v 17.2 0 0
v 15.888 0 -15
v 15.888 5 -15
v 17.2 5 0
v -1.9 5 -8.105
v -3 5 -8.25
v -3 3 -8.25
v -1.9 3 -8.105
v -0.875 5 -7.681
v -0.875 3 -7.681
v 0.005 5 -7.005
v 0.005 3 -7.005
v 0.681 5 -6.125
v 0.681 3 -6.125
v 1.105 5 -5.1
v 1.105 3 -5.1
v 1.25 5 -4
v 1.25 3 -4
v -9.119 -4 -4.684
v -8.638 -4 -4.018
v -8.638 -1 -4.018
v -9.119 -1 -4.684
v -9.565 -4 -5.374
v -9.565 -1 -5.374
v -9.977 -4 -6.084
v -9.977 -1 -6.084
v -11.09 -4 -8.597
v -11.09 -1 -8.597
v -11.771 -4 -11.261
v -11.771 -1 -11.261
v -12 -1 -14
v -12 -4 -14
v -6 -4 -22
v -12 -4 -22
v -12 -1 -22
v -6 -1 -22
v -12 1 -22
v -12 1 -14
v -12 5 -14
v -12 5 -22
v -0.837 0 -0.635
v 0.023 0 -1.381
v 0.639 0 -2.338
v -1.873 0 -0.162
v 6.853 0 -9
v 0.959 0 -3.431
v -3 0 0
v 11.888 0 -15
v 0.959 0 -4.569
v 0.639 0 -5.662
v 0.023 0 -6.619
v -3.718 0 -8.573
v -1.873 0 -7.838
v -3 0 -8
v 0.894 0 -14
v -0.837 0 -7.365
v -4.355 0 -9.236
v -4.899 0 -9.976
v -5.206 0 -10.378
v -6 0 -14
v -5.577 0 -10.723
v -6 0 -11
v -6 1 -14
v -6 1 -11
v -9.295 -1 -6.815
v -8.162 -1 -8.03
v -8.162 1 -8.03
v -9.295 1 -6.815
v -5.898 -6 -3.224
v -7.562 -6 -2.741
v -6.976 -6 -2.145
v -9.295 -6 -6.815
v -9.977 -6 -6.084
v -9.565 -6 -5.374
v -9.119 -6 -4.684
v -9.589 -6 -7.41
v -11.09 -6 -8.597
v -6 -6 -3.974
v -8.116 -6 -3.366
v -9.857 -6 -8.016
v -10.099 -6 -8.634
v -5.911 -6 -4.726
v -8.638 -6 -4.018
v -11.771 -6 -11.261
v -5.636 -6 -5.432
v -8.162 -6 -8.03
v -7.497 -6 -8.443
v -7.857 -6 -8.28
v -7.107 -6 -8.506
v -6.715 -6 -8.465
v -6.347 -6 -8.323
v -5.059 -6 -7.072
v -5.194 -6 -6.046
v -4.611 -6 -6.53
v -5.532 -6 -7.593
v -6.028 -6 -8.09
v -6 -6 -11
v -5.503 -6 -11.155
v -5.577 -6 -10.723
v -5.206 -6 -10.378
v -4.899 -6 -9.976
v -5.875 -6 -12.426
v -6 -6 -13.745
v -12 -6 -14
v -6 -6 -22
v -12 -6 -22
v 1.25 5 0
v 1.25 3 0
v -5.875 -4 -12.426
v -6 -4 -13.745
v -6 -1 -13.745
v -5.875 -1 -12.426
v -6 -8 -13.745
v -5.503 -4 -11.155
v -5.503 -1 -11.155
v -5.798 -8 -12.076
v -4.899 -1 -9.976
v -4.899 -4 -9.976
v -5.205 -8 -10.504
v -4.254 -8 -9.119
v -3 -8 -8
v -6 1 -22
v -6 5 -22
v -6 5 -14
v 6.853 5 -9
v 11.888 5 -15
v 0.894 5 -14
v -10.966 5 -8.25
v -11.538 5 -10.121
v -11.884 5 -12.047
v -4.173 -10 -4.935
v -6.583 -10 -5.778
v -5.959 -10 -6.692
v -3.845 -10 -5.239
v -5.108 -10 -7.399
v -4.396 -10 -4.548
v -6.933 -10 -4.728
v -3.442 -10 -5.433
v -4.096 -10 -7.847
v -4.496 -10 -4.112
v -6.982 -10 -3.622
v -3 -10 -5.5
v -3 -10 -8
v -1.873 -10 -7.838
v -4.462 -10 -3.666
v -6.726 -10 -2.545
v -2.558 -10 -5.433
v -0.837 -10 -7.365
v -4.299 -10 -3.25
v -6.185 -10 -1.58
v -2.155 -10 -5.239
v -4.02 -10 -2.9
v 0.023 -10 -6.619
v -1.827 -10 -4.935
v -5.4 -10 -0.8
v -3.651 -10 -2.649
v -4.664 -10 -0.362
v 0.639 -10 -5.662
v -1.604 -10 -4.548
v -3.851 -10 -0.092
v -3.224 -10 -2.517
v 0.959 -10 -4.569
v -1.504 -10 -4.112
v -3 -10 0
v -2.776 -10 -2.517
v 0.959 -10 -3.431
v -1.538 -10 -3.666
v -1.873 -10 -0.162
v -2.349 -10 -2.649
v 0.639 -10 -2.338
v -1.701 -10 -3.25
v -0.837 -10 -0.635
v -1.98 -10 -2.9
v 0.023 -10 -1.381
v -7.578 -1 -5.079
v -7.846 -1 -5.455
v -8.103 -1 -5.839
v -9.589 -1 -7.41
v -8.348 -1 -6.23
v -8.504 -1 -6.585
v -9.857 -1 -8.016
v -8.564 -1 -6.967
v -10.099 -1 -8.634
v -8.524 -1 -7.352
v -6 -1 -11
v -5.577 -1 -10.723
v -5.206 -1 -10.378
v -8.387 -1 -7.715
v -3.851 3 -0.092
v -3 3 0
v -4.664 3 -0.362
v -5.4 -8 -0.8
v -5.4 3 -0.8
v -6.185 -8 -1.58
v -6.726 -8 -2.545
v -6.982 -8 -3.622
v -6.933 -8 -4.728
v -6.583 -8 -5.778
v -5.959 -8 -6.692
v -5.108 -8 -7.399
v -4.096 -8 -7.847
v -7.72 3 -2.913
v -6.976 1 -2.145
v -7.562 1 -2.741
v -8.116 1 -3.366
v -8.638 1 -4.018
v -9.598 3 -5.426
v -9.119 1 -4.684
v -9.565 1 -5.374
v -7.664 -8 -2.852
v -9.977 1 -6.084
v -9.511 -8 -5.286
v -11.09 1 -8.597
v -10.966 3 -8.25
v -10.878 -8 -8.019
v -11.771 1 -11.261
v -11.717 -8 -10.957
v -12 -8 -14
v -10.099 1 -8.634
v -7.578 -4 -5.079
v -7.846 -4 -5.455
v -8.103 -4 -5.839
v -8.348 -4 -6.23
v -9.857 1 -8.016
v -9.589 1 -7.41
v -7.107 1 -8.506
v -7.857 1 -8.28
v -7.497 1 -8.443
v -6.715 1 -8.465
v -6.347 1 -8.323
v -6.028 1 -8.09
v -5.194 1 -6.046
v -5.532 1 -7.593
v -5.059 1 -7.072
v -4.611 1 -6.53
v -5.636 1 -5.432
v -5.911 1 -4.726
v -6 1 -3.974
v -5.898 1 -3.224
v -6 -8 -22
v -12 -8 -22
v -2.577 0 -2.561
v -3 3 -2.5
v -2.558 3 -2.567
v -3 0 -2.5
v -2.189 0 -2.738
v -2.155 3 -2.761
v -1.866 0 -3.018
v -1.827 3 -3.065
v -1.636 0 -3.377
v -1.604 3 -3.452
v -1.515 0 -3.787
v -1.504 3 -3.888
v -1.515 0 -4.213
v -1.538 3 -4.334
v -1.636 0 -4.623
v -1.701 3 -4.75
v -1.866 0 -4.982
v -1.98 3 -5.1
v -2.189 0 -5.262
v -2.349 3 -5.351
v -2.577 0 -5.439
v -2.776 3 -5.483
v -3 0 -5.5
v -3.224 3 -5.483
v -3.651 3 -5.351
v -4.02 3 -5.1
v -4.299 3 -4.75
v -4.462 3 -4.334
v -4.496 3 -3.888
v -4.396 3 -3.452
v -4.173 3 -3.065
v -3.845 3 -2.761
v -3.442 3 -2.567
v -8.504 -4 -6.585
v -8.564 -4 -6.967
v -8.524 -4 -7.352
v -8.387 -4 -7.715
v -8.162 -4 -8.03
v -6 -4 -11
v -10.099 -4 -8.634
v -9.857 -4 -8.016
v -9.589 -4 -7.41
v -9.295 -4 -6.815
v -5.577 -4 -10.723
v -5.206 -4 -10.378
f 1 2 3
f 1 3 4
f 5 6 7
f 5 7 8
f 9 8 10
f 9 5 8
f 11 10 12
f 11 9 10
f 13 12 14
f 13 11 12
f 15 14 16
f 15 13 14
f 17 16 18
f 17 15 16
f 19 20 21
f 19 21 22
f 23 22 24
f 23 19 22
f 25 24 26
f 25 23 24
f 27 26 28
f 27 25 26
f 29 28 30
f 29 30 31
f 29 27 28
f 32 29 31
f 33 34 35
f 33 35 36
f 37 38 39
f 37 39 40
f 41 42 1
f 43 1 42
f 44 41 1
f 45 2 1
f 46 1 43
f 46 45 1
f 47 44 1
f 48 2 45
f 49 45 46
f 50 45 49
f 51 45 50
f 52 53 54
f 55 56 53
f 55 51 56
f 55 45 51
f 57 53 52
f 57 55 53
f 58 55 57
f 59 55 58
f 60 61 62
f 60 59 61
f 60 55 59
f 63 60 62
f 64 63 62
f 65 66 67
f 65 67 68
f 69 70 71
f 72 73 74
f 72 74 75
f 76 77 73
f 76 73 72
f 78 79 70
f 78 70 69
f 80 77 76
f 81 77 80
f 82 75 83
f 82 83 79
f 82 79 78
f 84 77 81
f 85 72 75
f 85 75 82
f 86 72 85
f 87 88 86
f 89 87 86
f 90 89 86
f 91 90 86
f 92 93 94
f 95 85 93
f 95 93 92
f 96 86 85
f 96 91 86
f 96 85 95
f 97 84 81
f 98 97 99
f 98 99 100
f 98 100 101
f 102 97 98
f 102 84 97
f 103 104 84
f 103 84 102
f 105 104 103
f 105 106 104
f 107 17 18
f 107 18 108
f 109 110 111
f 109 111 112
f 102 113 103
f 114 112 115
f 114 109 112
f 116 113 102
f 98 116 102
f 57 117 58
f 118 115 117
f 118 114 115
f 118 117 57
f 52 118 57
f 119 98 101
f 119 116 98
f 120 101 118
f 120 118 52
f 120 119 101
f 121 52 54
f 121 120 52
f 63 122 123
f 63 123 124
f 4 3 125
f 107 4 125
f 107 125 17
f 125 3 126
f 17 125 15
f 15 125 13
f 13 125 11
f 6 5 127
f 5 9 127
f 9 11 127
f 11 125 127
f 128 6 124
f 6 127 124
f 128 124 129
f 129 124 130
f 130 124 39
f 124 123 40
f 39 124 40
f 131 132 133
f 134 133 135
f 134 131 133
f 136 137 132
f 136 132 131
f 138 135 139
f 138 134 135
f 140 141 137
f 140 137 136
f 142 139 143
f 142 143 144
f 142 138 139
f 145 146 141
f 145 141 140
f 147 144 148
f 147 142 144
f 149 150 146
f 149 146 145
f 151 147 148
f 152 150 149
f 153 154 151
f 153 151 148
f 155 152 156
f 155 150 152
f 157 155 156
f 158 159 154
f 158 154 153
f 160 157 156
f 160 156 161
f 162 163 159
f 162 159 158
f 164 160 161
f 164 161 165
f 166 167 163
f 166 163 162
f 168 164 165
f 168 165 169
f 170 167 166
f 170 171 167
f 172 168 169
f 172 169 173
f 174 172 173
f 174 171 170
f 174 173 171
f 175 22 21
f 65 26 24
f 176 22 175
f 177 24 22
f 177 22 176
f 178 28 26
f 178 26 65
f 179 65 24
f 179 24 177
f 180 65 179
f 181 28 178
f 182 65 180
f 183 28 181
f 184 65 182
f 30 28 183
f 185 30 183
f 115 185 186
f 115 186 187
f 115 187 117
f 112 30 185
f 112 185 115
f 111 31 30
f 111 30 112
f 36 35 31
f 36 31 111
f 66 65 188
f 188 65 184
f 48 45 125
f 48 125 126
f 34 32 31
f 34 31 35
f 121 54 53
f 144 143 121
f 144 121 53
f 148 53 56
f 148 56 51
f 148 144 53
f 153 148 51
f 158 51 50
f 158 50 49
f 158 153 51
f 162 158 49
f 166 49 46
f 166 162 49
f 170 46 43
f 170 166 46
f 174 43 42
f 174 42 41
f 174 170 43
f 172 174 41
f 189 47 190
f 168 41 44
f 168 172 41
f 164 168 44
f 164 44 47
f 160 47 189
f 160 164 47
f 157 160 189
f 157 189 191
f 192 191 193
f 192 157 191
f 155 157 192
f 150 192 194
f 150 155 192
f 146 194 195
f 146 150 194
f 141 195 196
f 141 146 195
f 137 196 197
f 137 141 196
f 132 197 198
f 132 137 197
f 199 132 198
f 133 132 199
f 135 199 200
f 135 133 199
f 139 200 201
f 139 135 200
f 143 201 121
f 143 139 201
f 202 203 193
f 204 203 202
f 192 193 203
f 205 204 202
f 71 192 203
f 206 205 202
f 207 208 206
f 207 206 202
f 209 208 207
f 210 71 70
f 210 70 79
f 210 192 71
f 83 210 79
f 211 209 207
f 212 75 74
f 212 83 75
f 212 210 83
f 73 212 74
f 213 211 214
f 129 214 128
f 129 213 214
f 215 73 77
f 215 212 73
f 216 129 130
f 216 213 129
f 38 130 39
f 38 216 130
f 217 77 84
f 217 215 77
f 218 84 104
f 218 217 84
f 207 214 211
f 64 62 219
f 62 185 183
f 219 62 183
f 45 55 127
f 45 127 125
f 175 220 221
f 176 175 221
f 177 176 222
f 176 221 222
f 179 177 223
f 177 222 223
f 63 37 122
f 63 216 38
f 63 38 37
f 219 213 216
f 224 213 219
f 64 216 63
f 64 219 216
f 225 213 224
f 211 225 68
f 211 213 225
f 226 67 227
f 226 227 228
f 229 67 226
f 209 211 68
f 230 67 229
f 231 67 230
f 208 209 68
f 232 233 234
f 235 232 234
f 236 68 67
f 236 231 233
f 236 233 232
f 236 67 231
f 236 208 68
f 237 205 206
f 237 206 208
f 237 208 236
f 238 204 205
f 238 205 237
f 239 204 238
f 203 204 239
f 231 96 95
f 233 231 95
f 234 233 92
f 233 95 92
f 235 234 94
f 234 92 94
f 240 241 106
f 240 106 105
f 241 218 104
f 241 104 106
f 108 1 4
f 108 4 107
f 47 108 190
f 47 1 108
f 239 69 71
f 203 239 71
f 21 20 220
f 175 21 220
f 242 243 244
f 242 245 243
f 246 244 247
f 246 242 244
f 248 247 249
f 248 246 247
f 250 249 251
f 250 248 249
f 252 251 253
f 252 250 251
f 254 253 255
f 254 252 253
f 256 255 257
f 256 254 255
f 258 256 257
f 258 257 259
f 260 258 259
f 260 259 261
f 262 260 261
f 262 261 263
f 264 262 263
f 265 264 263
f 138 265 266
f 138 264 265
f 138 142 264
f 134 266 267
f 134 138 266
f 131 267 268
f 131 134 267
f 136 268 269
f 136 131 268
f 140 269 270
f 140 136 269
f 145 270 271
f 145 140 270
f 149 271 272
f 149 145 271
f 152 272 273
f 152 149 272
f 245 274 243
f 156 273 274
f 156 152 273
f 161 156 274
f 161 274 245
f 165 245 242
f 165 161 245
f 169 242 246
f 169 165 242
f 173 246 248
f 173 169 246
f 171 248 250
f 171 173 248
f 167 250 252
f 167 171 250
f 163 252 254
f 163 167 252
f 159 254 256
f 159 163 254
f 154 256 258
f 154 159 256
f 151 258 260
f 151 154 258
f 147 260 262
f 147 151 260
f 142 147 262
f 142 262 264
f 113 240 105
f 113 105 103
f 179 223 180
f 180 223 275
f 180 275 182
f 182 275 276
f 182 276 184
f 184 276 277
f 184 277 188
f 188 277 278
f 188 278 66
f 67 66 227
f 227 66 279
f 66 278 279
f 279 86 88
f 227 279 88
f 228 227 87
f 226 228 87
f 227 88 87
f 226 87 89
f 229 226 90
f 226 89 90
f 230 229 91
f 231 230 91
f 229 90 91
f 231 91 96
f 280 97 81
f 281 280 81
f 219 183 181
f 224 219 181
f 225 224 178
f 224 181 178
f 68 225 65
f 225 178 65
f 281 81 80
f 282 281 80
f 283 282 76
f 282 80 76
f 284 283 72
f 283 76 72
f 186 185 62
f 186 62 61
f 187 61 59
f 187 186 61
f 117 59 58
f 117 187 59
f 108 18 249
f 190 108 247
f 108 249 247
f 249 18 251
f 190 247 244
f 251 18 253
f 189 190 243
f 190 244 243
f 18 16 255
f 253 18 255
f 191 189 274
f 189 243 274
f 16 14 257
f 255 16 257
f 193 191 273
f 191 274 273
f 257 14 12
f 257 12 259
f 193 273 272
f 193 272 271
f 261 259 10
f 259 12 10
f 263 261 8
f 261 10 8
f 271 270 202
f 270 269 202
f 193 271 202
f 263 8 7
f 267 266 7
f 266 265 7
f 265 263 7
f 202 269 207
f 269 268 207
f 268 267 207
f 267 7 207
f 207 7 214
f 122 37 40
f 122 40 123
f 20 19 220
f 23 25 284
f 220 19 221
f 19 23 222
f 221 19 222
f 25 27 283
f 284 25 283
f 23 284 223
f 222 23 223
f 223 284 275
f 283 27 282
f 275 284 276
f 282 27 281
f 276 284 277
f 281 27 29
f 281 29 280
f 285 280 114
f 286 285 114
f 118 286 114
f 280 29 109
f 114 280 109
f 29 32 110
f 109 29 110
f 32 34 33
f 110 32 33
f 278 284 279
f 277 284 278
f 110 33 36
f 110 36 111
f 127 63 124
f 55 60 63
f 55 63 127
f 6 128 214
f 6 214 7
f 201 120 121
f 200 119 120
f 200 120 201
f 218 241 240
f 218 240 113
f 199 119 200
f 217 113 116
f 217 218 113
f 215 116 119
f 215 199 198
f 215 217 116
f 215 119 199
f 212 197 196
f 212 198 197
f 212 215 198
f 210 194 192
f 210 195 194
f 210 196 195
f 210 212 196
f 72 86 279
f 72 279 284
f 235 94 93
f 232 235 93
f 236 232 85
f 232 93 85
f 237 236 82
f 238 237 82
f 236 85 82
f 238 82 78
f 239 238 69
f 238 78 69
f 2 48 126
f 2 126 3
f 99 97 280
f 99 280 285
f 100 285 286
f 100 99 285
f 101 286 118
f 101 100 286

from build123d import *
from build123d.topology import SkipClean

# Parameters (mm, degrees)
SKETCH1_R           = 1.5
BOSS_EXTRUDE1_DEPTH = 5
BOSS_EXTRUDE2_START = 10
SKETCH2_R           = 1.5
BOSS_EXTRUDE2_DEPTH = 10
CUT_EXTRUDE1_DEPTH  = 2
SKETCH4_OUTSIDE_W   = 39.104
SKETCH4_OUTSIDE_H   = 31.904
SKETCH4_OUTSIDE_R   = 4
CUT_EXTRUDE2_DEPTH  = 2
FILLET4_R           = 7
CUT_EXTRUDE5_START  = -9
CUT_EXTRUDE5_DEPTH  = 7
CUT_EXTRUDE7_START  = 2
CUT_EXTRUDE7_DEPTH  = 2
LPATTERN1_COUNT     = 2
LPATTERN1_PITCH     = 5
CUT_EXTRUDE9_START  = -2
CUT_EXTRUDE9_DEPTH  = 2
LPATTERN2_COUNT     = 2
LPATTERN2_PITCH     = 5
FILLET5_START       = -6
FILLET5_DEPTH       = 2
FILLET5_START_2     = -1
FILLET5_2_DEPTH     = 1


with BuildPart() as part:
    # Sketch1 → Boss-Extrude1 (new body)
    with BuildSketch(Plane(origin=(0, 0, 0), x_dir=(1, 0, 0), z_dir=(0, 1, 0))):
        with BuildLine():
            Line((-12, 14), (-12, 22))
            Line((-12, 22), (-6, 22))
            Line((-6, 22), (-6, 14))
            Line((-6, 14), (0.894304297, 14))
            Line((0.894304297, 14), (6.85307226, 9))
            Line((6.85307226, 9), (11.887670047, 15))
            Line((11.887670047, 15), (15.887670047, 15))
            Line((15.887670047, 15), (17.2, 0))
            Line((17.2, 0), (-3, 0))
            ThreePointArc((-3, 0), (-4.264911064, 0.205266808), (-5.4, 0.8))
            ThreePointArc((-5.4, 0.8), (-10.258048651, 6.620975674), (-12, 14))
        make_face()
        with Locations(Location((-3, 4, 0), (0, 0, 270))):
            Circle(SKETCH1_R, mode=Mode.SUBTRACT)
    extrude(amount=BOSS_EXTRUDE1_DEPTH)

    # Sketch2 → Boss-Extrude2 (add)
    with SkipClean():  # the faces are left unmerged after this step: merging them gives an invalid solid
        with BuildSketch(Plane.XZ.offset(BOSS_EXTRUDE2_START)):
            with BuildLine():
                Line((-12, -14), (-12, -22))
                Line((-12, -22), (-6, -22))
                Line((-6, -22), (-6, -8))
                Line((-6, -8), (-3, -8))
                ThreePointArc((-3, -8), (1, -4), (-3, 0))
                ThreePointArc((-3, 0), (-4.264911064, -0.205266808), (-5.4, -0.8))
                ThreePointArc((-5.4, -0.8), (-10.258048651, -6.620975674), (-12, -14))
            make_face()
            with Locations(Location((-3, -4, 0), (0, 0, 270))):
                Circle(SKETCH2_R, mode=Mode.SUBTRACT)
        extrude(amount=-BOSS_EXTRUDE2_DEPTH)

    # Sketch3 → Cut-Extrude1 (cut)
    with SkipClean():  # the faces are left unmerged after this step: merging them gives an invalid solid
        with BuildSketch(Plane(origin=(0, 5, 0), x_dir=(1, 0, 0), z_dir=(0, 1, 0))):
            with BuildLine():
                Line((1.25, 4), (1.25, 0))
                Line((1.25, 0), (-10.965687828, 0))
                Line((-10.965687828, 0), (-10.965687828, 8.25))
                Line((-10.965687828, 8.25), (-3, 8.25))
                ThreePointArc((-3, 8.25), (0.00520382, 7.00520382), (1.25, 4))
            make_face()
        extrude(amount=-CUT_EXTRUDE1_DEPTH, mode=Mode.SUBTRACT)

    # Sketch4 outside → Cut-Extrude2 (cut)
    with SkipClean():  # the faces are left unmerged after this step: merging them gives an invalid solid
        with BuildSketch(Plane.XZ.offset(10)):
            with Locations((2.6, -11)):
                Rectangle(SKETCH4_OUTSIDE_W, SKETCH4_OUTSIDE_H)
            with Locations(Location((-3, -4, 0), (0, 0, 270))):
                Circle(SKETCH4_OUTSIDE_R, mode=Mode.SUBTRACT)
        extrude(amount=-CUT_EXTRUDE2_DEPTH, mode=Mode.SUBTRACT)

    # Fillet4
    # the kernel refuses this fillet: 7 mm, written as the material it adds along each edge
    with BuildSketch(Plane(origin=(-6, -8, -8), x_dir=(0, 0, -1), z_dir=(0, 1, 0))) as fillet4_piece_1:
        with BuildLine():
            CenterArc((5.744562647, -7), FILLET4_R, 90, 55.150095421)
            Line((0, -3), (0, 0))
            Line((0, 0), (5.744562647, 0))
        make_face()
    extrude(amount=8)

    # Sketch8 → Cut-Extrude5 (cut)
    with BuildSketch(Plane(origin=(0, 3, 0), x_dir=(1, 0, 0), z_dir=(0, 1, 0)).offset(CUT_EXTRUDE5_START)):
        with BuildLine():
            Line((-8.638425733, 4.018428517), (-7.577765561, 5.079088689))
            ThreePointArc((-7.577765561, 5.079088689), (-7.976368998, 5.645642084), (-8.348417241, 6.229977223))
            ThreePointArc((-8.348417241, 6.229977223), (-8.003073705, 8.1765706), (-6.027976147, 8.090097651))
            ThreePointArc((-6.027976147, 8.090097651), (-5.292329992, 7.335150748), (-4.61146284, 6.530452037))
            ThreePointArc((-4.61146284, 6.530452037), (-5.795929923, 5.087554995), (-5.897777479, 3.223542865))
            Line((-5.897777479, 3.223542865), (-6.976385628, 2.144934715))
            ThreePointArc((-6.976385628, 2.144934715), (-7.843003254, 3.050101797), (-8.638425733, 4.018428517))
        make_face()
    extrude(amount=CUT_EXTRUDE5_DEPTH, mode=Mode.SUBTRACT)

    # Sketch10 → Cut-Extrude7 (cut)
    with BuildSketch(Plane.XZ.offset(-1).offset(CUT_EXTRUDE7_START)):
        with BuildLine():
            Line((-8.638425733, -4.018428517), (-7.577765561, -5.079088689))
            Line((-7.577765561, -5.079088689), (-8.348417241, -6.229977223))
            ThreePointArc((-8.348417241, -6.229977223), (-8.556847764, -7.161149711), (-8.16150889, -8.029615404))
            Line((-8.16150889, -8.029615404), (-9.977158514, -6.084074194))
            ThreePointArc((-9.977158514, -6.084074194), (-9.346365817, -5.026251972), (-8.638425733, -4.018428517))
        make_face()
    cut_extrude7 = extrude(amount=-CUT_EXTRUDE7_DEPTH, mode=Mode.SUBTRACT)

    # LPattern1: Cut-Extrude7 ×2
    with Locations(*[(0, -i * LPATTERN1_PITCH, 0) for i in range(1, LPATTERN1_COUNT)]):
        add(cut_extrude7, mode=Mode.SUBTRACT)

    # Sketch11 → Cut-Extrude9 (cut)
    with BuildSketch(Plane.XZ.offset(8).offset(CUT_EXTRUDE9_START)):
        with BuildLine():
            Line((-12, -22), (-6, -22))
            Line((-6, -22), (-6, -11))
            Line((-6, -11), (-10.09871087, -8.633608176))
            ThreePointArc((-10.09871087, -8.633608176), (-9.7258799, -7.711529492), (-9.294878189, -6.815164858))
            Line((-9.294878189, -6.815164858), (-9.977158514, -6.084074194))
            ThreePointArc((-9.977158514, -6.084074194), (-11.486292808, -9.914851011), (-12, -14))
            Line((-12, -14), (-12, -22))
        make_face()
    cut_extrude9 = extrude(amount=-CUT_EXTRUDE9_DEPTH, mode=Mode.SUBTRACT)

    # LPattern2: Cut-Extrude9 ×2
    with Locations(*[(0, i * LPATTERN2_PITCH, 0) for i in range(1, LPATTERN2_COUNT)]):
        add(cut_extrude9, mode=Mode.SUBTRACT)

    # Fillet5: read off the stored shape, not the designer's step
    # Fillet5 outline → Fillet5 (cut)
    with BuildSketch(Plane(origin=(0, 0, 0), x_dir=(1, 0, 0), z_dir=(0, 1, 0)).offset(FILLET5_START)):
        with BuildLine():
            Line((-6, 13.744562647), (-6, 11))
            ThreePointArc((-6, 11), (-5.384425539, 10.558219215), (-4.899169706, 9.976300875))
            ThreePointArc((-4.899169706, 9.976300875), (-5.719158725, 11.781680575), (-6, 13.744562647))
        make_face()
    extrude(amount=FILLET5_DEPTH, mode=Mode.SUBTRACT)

    # Fillet5 2 outline → Fillet5 2 (cut)
    with BuildSketch(Plane(origin=(0, 0, 0), x_dir=(1, 0, 0), z_dir=(0, 1, 0)).offset(FILLET5_START_2)):
        with BuildLine():
            Line((-6, 13.744562647), (-6, 11))
            ThreePointArc((-6, 11), (-5.384425539, 10.558219215), (-4.899169706, 9.976300875))
            ThreePointArc((-4.899169706, 9.976300875), (-5.719158725, 11.781680575), (-6, 13.744562647))
        make_face()
    extrude(amount=FILLET5_2_DEPTH, mode=Mode.SUBTRACT)


solid = part.part
